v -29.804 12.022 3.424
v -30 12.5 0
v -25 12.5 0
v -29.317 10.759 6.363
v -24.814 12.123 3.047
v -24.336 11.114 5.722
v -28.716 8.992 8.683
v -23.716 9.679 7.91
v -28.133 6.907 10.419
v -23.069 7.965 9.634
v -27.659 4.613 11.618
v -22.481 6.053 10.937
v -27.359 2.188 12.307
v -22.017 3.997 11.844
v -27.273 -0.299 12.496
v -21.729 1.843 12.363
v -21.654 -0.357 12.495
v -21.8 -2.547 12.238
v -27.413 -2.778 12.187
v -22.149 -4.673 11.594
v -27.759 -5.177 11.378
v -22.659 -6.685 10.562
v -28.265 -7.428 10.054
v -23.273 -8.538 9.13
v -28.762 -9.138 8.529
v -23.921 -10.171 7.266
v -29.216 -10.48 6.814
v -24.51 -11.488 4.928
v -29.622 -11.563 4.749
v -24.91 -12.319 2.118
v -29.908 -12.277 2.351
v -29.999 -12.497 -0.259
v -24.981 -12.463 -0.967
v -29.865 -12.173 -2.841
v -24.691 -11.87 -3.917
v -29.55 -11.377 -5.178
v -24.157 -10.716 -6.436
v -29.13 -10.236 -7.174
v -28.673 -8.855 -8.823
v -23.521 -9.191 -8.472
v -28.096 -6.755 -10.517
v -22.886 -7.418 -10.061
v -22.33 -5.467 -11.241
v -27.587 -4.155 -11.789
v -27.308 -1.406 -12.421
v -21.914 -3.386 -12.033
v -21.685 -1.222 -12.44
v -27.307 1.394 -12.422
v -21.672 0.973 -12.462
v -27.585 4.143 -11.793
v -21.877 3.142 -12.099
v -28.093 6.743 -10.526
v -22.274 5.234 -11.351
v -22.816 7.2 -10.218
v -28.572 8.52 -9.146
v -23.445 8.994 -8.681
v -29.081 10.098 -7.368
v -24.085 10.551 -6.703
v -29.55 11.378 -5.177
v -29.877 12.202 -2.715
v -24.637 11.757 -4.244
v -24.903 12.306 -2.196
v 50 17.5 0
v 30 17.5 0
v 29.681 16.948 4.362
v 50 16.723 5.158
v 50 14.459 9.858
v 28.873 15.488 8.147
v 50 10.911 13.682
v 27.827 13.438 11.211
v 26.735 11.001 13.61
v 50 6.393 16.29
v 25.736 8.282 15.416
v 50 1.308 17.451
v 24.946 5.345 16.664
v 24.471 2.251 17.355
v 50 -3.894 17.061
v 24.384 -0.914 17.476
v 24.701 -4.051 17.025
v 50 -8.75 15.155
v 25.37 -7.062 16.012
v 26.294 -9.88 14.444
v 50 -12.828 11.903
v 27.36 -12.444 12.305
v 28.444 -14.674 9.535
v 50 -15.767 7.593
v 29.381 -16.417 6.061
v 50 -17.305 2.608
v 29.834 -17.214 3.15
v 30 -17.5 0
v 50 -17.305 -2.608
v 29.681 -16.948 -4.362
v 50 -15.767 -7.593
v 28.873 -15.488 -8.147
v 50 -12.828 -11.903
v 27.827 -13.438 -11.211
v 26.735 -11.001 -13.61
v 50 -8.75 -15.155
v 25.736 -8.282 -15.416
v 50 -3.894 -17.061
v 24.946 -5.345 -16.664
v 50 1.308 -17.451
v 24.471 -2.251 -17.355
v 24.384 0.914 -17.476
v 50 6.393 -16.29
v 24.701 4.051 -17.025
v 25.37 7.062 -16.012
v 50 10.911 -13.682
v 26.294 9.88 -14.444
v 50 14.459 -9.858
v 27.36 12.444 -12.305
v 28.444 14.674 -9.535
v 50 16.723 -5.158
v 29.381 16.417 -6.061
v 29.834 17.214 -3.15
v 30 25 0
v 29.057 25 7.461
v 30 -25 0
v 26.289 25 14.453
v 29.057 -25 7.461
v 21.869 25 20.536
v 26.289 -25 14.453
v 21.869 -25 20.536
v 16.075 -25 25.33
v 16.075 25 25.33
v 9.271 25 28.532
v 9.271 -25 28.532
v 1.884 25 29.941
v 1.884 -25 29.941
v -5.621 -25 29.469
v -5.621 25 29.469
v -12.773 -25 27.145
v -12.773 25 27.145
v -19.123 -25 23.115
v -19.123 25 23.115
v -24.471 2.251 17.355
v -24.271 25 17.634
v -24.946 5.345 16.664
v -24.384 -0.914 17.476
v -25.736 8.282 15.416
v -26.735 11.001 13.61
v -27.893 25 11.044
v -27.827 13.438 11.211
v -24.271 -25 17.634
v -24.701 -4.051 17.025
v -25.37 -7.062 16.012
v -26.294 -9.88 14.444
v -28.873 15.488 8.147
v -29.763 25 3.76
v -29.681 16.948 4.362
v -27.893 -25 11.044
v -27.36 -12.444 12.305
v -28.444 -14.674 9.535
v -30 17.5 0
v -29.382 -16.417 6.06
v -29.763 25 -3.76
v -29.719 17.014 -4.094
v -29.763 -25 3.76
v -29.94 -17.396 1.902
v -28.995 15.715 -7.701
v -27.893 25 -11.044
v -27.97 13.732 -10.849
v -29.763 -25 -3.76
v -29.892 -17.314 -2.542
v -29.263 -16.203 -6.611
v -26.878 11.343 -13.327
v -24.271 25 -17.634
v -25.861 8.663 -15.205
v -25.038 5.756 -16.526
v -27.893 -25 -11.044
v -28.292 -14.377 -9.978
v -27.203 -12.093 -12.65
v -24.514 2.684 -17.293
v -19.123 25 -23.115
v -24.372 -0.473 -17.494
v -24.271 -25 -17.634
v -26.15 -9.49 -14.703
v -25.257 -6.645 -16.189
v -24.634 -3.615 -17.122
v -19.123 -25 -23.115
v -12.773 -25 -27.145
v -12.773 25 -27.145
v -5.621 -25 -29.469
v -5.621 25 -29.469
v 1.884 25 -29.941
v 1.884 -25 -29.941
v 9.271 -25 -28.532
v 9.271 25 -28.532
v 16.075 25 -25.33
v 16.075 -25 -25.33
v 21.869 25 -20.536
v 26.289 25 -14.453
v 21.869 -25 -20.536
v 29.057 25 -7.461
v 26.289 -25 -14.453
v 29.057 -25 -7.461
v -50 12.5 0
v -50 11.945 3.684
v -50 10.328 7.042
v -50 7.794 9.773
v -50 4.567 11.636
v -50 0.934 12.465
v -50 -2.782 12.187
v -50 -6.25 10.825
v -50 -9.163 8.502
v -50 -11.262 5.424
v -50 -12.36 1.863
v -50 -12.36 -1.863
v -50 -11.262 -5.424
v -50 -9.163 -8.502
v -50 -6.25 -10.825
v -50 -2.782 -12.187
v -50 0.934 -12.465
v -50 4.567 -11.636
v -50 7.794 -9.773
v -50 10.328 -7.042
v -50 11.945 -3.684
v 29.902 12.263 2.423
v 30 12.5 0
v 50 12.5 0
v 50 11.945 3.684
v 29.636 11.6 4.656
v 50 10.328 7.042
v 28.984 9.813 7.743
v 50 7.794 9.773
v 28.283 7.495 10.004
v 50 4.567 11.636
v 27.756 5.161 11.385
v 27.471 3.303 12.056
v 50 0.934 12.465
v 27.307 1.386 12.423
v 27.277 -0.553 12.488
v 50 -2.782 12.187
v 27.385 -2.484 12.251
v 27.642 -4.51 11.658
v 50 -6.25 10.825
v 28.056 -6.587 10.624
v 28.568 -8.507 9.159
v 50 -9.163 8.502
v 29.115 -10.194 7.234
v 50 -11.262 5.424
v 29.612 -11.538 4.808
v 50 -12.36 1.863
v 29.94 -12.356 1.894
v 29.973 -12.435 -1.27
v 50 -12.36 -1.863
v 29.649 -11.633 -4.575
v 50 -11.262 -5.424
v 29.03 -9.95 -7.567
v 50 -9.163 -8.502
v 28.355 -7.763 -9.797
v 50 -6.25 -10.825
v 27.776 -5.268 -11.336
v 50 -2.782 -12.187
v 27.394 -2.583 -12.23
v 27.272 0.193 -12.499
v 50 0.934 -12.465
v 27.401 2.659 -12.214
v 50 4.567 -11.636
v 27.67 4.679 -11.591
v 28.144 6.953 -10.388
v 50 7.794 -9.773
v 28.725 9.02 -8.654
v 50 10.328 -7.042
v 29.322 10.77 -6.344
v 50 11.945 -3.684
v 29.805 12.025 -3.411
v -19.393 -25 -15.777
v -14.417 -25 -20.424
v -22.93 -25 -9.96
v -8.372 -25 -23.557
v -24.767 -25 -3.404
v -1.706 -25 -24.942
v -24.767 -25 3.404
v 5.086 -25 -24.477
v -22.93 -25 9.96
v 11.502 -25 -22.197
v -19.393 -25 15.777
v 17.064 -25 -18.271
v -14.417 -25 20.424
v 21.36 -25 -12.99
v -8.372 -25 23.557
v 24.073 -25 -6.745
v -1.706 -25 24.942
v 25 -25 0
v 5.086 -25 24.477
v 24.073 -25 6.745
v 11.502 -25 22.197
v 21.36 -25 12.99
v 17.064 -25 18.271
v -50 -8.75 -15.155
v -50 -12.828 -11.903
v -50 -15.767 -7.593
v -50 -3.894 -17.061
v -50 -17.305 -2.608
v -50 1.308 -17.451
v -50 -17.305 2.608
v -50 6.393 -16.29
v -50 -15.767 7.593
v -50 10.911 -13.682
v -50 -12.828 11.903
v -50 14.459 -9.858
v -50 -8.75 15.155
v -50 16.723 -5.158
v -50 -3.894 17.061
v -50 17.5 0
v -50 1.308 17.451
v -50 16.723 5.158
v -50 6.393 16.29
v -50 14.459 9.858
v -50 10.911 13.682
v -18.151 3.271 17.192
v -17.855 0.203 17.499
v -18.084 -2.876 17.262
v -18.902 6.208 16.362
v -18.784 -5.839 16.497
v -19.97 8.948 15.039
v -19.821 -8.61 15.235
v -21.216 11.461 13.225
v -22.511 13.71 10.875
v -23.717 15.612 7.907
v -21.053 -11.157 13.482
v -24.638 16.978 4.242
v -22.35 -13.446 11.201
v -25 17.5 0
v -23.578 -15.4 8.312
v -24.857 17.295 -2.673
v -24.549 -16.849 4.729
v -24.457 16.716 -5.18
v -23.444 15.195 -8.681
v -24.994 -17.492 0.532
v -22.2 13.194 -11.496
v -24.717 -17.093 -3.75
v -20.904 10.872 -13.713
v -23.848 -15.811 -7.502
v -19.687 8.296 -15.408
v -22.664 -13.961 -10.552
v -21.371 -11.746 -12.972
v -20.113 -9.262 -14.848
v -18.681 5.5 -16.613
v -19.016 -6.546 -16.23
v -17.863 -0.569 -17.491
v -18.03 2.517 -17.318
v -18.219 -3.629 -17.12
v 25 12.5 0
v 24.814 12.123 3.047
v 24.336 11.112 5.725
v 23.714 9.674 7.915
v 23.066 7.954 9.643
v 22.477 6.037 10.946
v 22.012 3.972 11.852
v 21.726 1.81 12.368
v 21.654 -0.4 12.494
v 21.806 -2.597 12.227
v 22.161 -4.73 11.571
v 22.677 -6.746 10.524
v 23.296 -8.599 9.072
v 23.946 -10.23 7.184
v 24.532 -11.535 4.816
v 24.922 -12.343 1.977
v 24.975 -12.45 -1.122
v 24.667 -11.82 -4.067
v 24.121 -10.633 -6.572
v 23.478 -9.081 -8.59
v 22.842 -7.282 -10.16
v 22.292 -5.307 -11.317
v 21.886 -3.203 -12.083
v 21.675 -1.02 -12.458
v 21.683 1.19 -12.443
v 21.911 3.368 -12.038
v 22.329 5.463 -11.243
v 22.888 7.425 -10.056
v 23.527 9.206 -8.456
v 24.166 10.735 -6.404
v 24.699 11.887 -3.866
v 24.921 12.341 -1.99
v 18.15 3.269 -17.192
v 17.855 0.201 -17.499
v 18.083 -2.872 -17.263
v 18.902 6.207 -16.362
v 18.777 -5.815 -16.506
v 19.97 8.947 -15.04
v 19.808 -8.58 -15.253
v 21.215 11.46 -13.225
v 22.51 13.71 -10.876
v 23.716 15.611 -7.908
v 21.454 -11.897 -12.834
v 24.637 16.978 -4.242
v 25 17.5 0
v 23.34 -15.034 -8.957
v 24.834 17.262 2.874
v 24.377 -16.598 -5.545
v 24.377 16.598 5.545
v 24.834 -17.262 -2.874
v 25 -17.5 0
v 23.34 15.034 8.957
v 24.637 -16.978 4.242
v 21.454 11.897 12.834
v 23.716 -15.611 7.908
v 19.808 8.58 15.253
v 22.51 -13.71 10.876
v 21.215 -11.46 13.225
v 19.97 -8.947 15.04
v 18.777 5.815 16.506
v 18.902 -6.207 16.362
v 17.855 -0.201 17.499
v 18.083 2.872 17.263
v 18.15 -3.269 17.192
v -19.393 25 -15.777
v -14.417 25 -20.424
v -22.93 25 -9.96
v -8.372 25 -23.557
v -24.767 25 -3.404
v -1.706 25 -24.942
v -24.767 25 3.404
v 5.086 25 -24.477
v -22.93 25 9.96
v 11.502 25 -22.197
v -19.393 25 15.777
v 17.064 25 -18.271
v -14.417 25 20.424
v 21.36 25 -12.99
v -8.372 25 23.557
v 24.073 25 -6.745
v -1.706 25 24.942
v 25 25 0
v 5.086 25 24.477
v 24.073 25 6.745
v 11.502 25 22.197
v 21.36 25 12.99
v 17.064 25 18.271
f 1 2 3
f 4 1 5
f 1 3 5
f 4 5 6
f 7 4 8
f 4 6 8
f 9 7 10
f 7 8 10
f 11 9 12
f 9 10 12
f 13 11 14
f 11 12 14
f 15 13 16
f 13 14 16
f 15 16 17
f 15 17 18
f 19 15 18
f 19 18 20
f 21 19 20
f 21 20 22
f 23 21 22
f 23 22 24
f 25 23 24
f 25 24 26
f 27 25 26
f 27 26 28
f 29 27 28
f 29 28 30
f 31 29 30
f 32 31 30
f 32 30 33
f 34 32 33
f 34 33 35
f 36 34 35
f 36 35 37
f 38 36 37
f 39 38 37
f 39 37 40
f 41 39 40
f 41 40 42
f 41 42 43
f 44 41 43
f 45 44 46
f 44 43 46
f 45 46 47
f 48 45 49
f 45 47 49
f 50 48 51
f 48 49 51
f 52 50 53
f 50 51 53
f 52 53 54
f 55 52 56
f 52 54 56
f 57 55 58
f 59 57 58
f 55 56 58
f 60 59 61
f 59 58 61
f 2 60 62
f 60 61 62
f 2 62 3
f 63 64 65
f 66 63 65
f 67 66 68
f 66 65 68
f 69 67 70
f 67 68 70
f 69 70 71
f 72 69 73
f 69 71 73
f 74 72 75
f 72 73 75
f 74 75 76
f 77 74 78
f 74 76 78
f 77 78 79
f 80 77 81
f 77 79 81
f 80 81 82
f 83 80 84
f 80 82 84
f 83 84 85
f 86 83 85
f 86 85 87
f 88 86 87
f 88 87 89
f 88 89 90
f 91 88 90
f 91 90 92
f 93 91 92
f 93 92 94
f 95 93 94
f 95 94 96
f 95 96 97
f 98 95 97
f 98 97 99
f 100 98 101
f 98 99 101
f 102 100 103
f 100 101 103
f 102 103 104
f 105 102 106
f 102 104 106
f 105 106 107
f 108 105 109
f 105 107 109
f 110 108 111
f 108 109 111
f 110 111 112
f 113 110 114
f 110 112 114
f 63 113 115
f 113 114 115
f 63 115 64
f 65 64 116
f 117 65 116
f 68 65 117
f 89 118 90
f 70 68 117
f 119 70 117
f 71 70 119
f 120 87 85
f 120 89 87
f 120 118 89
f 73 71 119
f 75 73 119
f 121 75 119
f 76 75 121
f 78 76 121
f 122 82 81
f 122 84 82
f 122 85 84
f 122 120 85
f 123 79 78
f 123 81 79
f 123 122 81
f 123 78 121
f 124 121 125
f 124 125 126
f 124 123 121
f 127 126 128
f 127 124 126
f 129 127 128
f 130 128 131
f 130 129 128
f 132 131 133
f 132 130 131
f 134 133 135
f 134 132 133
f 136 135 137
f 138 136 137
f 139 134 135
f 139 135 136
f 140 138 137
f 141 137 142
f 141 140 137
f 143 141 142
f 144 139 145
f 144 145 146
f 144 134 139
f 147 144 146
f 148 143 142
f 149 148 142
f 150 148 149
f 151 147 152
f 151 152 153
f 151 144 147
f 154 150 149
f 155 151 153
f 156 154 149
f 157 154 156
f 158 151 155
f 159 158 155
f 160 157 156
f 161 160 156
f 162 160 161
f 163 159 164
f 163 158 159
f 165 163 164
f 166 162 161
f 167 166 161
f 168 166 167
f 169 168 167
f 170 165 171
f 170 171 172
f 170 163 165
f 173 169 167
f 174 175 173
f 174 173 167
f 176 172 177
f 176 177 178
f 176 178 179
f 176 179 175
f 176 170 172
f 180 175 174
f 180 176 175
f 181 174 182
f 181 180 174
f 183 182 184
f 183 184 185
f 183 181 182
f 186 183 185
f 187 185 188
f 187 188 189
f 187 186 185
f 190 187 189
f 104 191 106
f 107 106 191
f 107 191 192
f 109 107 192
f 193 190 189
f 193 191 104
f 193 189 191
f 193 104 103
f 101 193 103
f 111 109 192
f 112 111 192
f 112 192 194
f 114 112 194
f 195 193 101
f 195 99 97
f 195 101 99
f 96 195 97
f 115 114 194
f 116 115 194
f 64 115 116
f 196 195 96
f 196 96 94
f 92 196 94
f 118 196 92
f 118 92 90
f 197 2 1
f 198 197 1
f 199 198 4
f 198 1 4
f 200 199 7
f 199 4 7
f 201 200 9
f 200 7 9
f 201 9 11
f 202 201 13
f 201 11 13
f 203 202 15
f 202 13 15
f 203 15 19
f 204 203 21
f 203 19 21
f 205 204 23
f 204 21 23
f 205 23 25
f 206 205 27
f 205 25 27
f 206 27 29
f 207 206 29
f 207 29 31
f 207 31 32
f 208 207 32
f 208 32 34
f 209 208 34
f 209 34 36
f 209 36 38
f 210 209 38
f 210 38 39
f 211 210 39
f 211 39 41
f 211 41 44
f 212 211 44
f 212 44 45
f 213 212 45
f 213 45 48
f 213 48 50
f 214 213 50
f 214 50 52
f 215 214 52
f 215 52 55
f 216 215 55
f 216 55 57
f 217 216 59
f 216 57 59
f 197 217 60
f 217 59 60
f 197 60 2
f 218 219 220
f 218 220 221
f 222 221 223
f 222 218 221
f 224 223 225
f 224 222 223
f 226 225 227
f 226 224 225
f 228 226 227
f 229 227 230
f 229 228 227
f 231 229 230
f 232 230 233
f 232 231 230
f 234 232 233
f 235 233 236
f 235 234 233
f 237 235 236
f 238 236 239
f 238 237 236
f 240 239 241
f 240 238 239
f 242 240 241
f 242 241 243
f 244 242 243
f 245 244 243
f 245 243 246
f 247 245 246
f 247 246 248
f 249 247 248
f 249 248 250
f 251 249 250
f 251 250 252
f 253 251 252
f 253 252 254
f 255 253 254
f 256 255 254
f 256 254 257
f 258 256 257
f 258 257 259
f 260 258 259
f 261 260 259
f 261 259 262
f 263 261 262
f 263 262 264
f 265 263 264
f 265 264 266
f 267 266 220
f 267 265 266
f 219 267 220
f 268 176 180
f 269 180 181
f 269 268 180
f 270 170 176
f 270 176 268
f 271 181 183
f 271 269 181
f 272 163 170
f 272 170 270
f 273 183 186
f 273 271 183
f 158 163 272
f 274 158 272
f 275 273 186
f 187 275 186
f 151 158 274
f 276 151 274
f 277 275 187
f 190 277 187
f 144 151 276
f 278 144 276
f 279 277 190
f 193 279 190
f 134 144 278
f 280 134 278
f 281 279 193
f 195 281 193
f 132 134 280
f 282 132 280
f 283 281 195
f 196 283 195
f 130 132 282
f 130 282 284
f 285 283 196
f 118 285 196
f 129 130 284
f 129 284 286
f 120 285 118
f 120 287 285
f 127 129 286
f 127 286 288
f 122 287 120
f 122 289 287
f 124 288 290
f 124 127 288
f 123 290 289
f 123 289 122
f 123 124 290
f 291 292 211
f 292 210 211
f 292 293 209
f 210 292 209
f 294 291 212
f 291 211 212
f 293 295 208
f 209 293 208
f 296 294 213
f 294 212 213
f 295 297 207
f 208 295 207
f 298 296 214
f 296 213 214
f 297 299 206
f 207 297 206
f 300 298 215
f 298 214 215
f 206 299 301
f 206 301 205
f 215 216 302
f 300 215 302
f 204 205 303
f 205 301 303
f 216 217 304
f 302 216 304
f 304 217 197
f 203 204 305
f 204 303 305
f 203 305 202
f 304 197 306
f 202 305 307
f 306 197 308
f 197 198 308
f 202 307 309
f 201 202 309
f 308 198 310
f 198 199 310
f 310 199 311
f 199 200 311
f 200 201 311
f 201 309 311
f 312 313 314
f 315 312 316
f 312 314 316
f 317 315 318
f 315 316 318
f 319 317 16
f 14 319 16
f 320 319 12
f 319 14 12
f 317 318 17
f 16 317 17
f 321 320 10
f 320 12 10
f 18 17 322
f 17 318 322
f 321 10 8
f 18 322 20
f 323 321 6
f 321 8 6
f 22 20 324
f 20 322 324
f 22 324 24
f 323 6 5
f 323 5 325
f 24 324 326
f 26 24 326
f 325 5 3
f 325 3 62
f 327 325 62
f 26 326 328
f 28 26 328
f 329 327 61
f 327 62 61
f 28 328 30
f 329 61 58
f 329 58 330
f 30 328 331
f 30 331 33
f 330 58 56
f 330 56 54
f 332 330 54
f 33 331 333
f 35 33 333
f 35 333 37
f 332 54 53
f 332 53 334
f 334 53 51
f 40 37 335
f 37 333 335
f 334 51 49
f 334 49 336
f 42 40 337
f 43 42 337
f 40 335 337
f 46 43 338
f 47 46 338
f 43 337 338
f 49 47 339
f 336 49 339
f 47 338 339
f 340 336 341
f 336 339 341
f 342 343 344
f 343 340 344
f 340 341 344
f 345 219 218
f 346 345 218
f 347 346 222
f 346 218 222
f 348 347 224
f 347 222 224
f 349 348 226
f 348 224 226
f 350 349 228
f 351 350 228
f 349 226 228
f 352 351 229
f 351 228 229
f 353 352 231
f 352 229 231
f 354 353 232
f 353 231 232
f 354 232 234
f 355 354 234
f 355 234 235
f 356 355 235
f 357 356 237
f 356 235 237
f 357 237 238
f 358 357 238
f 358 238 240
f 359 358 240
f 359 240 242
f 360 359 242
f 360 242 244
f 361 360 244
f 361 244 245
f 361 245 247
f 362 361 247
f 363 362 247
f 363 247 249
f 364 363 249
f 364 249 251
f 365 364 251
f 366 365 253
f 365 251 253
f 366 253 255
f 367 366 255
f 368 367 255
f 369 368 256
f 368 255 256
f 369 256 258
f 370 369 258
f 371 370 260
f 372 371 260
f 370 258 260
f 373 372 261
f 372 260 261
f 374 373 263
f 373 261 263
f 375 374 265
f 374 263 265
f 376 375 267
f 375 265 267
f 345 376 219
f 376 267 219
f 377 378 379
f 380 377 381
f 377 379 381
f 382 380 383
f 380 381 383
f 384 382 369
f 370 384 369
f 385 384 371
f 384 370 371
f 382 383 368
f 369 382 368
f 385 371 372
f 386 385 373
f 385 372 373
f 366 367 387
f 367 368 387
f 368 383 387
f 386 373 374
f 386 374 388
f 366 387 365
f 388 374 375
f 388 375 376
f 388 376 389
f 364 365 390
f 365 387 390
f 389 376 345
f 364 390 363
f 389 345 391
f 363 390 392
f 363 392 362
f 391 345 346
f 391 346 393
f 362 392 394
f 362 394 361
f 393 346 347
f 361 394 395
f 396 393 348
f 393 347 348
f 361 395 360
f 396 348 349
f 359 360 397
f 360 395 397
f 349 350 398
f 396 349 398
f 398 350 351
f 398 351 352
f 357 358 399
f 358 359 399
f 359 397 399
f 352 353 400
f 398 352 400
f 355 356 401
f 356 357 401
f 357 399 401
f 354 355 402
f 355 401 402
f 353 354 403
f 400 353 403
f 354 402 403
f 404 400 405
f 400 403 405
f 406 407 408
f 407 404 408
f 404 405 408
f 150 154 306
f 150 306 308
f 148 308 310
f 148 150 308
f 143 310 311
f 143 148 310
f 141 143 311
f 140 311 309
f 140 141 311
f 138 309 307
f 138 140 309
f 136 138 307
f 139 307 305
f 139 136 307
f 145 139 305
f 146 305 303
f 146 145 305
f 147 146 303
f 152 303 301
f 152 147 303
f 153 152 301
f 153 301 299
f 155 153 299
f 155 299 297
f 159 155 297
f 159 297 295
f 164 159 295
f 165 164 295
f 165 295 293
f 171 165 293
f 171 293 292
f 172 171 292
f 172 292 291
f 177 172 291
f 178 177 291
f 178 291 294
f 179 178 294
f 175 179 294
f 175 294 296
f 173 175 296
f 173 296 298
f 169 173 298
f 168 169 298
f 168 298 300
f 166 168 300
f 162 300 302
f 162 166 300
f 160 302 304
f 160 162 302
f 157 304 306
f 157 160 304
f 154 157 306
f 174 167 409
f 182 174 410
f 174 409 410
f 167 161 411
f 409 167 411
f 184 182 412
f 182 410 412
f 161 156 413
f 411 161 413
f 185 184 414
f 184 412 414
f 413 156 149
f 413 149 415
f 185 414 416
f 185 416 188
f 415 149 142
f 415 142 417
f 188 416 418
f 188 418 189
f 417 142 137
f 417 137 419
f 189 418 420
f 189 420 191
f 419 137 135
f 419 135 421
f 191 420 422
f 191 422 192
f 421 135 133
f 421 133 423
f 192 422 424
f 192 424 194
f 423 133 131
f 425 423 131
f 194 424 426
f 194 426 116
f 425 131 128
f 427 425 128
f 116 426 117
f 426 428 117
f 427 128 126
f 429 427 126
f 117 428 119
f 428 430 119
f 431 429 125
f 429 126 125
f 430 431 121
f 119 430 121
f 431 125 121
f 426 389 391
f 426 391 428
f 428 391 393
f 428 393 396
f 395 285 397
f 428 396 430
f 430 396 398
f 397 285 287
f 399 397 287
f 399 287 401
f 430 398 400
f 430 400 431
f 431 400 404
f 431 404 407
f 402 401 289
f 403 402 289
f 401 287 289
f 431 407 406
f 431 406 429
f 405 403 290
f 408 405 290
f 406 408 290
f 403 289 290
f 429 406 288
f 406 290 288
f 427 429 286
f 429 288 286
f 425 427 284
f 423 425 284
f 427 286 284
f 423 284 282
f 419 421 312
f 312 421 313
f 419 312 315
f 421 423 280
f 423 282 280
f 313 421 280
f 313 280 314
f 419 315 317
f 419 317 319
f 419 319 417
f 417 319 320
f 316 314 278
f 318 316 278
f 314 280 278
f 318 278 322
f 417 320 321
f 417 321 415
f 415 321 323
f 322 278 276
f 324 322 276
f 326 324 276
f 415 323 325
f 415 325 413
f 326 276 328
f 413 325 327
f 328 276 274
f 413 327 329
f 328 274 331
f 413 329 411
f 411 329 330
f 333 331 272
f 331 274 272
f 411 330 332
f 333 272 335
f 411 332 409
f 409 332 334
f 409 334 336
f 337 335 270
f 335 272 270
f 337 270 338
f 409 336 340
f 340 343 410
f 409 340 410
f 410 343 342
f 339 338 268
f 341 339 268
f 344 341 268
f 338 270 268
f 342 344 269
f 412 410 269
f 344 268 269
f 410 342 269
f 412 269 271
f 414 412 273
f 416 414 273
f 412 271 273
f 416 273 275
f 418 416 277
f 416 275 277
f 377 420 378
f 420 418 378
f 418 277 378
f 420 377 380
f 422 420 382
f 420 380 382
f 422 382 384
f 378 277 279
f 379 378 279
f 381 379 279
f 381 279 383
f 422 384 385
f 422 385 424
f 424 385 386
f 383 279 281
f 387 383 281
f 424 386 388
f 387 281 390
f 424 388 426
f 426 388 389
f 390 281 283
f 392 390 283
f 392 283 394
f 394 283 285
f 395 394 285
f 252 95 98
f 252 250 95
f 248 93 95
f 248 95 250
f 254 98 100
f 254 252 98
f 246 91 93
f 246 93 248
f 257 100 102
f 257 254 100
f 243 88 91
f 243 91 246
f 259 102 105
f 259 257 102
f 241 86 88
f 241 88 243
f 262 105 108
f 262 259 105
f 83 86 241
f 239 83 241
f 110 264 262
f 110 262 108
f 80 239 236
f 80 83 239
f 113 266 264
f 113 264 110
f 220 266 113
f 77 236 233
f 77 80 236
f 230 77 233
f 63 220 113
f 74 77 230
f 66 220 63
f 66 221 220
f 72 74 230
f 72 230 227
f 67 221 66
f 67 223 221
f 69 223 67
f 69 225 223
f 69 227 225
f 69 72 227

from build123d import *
from build123d import SkipClean  # not in build123d's __all__

# Parameters (mm, degrees)
F0_R          = 30
F0_R_2        = 25
F1_DEPTH      = 25
F1_DEPTH_BACK = 25
F2_R          = 17.5
F2_R_2        = 12.5
F3_DEPTH      = 50
F3_DEPTH_BACK = 50
F4_R          = 25
F5_DEPTH      = 50
F6_R          = 12.5
F7_DEPTH      = 100.0010001


with BuildPart() as f1:
    # F0 (on Front) → F1 (new body, two sides)
    with BuildSketch(Plane.XZ) as f1_sk:
        Circle(F0_R)
        Circle(F0_R_2, mode=Mode.SUBTRACT)
    extrude(amount=F1_DEPTH)
    extrude(f1_sk.sketch, amount=-F1_DEPTH_BACK)

    # F2 (on Right) → F3 (join, two sides)
    with BuildSketch(Plane.YZ) as f3_sk:
        Circle(F2_R)
        Circle(F2_R_2, mode=Mode.SUBTRACT)
    extrude(amount=F3_DEPTH)
    extrude(f3_sk.sketch, amount=-F3_DEPTH_BACK)

    # F4 (on face) → F5 (cut, through all)
    with BuildSketch(Plane.XZ.offset(25)):
        Circle(F4_R)
    extrude(amount=-F5_DEPTH, mode=Mode.SUBTRACT)

    # F6 (on face) → F7 (cut, through all)
    with BuildSketch(Plane.YZ.offset(50)):
        Circle(F6_R)
    with SkipClean():  # cleaning this boolean's faces spoils the solid; the shape is the same uncleaned
        extrude(amount=-F7_DEPTH, mode=Mode.SUBTRACT)


solid = f1.part
